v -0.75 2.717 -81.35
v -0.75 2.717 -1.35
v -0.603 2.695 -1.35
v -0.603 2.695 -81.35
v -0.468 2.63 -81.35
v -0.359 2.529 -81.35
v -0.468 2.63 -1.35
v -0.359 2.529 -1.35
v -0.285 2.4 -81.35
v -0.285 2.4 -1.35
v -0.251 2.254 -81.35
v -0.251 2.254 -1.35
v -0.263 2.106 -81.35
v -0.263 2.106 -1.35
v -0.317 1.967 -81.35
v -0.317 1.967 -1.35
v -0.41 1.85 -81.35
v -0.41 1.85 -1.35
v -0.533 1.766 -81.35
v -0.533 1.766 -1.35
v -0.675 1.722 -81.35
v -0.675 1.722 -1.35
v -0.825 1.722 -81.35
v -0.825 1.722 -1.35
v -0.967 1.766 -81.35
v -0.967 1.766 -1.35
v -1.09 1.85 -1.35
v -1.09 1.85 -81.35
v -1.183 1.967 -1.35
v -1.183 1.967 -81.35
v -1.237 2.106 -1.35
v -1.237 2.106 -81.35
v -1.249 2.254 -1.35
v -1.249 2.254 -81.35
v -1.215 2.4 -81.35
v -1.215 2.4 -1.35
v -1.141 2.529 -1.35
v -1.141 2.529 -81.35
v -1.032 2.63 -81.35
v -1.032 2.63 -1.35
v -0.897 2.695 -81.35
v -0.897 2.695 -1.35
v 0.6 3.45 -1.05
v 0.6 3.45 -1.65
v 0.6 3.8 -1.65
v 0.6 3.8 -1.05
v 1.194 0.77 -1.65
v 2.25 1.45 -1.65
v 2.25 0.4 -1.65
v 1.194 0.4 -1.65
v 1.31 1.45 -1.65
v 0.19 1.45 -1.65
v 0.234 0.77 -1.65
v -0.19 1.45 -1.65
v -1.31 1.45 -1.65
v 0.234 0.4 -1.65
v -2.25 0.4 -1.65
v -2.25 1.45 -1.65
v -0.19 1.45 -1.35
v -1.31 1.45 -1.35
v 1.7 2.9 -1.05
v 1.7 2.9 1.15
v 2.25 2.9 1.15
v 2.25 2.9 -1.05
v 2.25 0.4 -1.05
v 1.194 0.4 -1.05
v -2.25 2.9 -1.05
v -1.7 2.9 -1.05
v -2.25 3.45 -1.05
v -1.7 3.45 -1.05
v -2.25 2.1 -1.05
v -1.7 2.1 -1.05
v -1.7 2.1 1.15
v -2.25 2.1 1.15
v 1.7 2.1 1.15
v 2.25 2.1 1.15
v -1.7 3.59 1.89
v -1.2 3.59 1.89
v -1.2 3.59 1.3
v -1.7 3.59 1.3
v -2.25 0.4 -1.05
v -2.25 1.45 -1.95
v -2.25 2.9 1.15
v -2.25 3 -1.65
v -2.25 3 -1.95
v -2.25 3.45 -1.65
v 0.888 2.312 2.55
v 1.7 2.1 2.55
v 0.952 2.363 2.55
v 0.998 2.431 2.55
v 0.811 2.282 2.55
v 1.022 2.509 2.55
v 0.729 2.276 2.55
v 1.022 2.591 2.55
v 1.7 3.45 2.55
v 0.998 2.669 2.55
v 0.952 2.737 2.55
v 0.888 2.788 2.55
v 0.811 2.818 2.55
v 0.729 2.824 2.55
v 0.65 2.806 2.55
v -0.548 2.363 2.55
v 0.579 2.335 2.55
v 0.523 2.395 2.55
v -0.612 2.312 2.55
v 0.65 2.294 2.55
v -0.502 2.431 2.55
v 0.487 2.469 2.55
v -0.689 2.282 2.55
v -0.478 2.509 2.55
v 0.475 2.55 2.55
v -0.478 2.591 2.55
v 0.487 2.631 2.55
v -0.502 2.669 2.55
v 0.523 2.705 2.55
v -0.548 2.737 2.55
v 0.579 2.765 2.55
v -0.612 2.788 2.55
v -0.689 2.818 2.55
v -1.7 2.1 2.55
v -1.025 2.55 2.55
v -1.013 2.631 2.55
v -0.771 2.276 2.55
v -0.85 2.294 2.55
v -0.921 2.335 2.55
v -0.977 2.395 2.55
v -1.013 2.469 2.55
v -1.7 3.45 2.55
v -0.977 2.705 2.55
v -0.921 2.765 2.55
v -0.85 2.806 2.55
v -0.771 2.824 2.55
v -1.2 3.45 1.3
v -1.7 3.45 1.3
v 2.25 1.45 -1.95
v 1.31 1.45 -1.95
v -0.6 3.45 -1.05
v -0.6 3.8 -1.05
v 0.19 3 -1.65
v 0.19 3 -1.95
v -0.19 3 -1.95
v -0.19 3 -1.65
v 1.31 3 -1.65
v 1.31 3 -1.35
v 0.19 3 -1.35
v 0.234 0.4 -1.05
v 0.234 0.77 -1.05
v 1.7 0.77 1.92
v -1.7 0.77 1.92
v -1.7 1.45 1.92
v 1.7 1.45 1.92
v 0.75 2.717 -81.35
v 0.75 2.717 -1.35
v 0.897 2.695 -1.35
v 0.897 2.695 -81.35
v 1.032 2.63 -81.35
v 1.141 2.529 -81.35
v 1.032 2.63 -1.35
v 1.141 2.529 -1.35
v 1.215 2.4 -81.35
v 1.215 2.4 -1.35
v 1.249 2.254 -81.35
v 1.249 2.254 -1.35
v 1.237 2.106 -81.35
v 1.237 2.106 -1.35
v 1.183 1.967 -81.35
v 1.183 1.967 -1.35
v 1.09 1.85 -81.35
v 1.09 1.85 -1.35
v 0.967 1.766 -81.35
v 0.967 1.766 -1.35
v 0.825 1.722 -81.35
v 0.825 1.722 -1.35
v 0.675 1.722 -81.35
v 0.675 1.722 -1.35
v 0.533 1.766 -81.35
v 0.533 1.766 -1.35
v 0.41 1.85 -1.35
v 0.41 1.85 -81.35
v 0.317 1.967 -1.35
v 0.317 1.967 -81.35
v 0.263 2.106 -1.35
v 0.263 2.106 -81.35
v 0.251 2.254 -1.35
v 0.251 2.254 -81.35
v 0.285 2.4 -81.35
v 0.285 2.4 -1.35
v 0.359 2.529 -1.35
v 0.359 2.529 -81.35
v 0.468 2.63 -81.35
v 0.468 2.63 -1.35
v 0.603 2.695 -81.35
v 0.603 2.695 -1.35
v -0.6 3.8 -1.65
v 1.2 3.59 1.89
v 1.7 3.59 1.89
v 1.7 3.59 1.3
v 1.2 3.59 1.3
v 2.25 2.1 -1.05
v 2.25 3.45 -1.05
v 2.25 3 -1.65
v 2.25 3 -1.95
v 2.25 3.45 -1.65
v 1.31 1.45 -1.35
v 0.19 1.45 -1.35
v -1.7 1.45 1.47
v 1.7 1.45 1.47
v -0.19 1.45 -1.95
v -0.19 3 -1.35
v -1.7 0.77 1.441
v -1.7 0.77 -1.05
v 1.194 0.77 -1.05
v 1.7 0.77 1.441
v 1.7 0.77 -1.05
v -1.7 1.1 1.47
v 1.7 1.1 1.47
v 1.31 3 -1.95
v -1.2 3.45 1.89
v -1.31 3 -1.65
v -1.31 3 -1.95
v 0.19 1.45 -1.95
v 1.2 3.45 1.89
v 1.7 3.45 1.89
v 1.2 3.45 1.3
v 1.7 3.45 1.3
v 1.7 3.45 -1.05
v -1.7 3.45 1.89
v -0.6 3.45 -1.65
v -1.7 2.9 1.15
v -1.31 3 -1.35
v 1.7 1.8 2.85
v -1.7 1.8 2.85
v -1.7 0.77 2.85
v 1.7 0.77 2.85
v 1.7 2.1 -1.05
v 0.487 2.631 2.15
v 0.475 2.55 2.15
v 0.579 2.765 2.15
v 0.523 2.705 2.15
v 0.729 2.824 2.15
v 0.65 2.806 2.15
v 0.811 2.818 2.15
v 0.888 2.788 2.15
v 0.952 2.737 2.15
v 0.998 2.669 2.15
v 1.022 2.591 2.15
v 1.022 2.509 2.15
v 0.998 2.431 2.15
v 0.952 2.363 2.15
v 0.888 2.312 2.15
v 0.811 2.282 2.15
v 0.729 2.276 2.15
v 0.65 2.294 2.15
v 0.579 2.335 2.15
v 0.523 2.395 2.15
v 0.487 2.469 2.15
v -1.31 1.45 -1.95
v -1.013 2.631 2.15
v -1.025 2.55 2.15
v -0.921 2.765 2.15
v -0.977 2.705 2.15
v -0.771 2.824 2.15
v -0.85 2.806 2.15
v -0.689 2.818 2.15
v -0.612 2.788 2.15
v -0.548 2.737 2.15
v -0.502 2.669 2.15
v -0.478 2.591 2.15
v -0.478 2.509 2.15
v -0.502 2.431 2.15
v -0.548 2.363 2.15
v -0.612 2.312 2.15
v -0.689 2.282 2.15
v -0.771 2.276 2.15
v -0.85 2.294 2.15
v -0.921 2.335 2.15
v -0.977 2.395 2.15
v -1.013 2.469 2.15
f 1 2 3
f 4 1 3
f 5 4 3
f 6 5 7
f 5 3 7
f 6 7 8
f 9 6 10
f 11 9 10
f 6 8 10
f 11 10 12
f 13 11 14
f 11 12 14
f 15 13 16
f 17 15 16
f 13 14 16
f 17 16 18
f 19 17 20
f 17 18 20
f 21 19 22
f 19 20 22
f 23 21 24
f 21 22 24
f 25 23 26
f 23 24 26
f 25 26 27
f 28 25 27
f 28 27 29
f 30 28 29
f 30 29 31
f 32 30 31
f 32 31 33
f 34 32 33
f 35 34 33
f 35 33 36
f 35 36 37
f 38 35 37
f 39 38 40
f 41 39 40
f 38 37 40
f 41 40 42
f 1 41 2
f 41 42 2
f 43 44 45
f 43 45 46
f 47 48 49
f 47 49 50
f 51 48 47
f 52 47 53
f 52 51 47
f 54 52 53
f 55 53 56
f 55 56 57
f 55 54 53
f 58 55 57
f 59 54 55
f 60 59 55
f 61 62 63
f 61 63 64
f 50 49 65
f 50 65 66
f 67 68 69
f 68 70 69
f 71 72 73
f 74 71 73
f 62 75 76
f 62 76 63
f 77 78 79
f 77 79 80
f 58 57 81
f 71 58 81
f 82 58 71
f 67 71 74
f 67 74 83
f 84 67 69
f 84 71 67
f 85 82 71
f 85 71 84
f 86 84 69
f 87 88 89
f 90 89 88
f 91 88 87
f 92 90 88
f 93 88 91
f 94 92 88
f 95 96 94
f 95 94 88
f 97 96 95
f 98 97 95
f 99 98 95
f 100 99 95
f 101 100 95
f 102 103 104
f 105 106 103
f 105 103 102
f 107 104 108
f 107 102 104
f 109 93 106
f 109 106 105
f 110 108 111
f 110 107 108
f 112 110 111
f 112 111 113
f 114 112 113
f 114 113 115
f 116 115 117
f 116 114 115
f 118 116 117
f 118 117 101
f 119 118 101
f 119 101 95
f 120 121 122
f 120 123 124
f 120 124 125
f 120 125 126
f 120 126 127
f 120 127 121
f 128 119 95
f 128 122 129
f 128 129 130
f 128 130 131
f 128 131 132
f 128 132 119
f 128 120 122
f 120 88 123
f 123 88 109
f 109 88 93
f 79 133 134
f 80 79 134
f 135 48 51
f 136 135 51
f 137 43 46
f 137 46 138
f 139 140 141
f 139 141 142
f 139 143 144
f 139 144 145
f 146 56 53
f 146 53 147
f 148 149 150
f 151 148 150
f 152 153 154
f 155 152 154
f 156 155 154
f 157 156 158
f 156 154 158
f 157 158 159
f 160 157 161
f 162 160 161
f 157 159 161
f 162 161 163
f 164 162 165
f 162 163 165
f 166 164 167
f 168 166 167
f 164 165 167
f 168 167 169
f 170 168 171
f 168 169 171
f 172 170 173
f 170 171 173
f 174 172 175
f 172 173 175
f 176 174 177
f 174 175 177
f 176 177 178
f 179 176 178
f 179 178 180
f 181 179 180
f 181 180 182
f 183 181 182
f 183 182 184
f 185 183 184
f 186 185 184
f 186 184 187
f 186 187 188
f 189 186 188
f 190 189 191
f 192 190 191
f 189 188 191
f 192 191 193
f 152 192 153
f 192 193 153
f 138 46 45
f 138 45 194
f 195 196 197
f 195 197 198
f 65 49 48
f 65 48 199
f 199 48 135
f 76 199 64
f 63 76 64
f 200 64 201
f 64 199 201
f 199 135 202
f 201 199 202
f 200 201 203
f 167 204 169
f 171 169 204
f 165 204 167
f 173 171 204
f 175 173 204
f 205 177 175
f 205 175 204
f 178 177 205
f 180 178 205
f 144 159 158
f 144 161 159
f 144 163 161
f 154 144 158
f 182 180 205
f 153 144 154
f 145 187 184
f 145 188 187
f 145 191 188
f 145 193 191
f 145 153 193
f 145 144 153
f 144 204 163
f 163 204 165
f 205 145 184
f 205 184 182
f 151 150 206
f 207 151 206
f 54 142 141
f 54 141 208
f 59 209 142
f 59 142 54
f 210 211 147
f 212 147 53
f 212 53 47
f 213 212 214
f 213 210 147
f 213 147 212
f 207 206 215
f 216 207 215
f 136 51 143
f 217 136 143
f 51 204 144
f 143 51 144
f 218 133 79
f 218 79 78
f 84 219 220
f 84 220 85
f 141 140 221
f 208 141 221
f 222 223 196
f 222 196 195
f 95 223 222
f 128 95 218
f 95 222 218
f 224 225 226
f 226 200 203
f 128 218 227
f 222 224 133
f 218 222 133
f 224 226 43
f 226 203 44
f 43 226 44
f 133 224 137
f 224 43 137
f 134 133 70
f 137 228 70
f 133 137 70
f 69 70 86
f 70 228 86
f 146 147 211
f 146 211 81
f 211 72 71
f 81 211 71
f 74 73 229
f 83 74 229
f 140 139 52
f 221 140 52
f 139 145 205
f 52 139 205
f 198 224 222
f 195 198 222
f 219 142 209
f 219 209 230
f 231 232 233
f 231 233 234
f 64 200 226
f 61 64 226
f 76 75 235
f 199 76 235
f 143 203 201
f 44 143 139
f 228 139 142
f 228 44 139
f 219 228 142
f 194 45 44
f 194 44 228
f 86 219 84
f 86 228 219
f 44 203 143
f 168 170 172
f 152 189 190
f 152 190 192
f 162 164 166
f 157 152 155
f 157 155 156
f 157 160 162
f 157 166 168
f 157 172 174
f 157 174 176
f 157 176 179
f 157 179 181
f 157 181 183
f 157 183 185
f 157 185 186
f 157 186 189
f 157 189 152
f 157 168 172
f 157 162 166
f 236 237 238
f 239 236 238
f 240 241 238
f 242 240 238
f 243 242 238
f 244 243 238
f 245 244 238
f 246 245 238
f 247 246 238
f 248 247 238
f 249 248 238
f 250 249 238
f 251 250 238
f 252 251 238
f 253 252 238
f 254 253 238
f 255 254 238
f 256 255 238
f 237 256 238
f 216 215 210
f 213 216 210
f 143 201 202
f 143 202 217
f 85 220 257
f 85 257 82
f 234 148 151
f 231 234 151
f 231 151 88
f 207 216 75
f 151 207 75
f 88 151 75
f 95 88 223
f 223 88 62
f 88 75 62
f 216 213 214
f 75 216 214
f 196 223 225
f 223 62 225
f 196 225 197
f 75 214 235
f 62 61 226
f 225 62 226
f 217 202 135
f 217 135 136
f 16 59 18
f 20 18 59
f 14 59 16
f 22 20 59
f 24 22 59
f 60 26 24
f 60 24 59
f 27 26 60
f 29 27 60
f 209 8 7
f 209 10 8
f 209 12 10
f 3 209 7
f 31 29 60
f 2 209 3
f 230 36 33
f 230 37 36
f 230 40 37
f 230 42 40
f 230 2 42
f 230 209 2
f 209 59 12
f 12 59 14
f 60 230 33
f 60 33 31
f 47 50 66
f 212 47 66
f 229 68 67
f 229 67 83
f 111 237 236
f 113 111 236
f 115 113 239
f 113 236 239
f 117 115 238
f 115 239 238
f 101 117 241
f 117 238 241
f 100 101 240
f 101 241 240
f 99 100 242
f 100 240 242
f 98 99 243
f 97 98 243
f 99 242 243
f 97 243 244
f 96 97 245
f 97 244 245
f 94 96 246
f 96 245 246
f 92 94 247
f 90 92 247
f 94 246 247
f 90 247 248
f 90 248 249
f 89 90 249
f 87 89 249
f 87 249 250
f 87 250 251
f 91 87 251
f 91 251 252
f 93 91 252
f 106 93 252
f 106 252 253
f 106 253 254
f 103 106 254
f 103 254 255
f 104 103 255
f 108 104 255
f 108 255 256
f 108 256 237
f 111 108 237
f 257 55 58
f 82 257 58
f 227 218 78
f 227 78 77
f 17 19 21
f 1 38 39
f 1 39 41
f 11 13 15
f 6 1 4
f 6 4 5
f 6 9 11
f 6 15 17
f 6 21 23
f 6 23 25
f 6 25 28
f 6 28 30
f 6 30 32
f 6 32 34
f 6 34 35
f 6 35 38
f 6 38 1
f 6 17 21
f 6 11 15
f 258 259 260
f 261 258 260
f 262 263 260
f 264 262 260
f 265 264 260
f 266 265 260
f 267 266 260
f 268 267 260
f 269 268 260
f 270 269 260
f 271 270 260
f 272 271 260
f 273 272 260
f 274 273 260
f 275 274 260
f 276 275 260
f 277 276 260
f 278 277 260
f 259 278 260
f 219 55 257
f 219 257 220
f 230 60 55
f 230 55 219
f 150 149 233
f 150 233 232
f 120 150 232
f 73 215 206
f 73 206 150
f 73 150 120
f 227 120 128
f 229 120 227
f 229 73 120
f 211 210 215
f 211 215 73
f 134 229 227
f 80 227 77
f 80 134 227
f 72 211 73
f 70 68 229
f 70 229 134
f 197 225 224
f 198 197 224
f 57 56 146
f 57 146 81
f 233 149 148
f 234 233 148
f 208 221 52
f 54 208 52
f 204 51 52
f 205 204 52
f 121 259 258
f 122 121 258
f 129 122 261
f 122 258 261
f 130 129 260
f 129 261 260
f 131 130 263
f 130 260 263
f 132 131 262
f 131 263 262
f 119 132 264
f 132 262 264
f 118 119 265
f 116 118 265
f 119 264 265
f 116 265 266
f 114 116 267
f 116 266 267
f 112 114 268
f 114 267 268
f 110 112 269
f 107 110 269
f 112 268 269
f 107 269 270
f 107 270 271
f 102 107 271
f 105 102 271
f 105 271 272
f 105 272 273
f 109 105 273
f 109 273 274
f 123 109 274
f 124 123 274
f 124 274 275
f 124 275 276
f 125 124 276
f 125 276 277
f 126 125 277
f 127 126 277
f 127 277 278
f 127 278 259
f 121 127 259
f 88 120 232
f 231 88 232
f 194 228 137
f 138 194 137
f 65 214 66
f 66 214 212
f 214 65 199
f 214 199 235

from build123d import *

# Parameters (mm, degrees)
SKETCH1_W                        = 4.5
SKETCH1_H                        = 3.05
BOSS_EXTRUDE1_DEPTH              = 0.6
SKETCH2_W                        = 0.94
SKETCH2_H                        = 1.55
BOSS_EXTRUDE2_DEPTH              = 0.3
SKETCH3_W                        = 0.94
SKETCH3_H                        = 1.55
BOSS_EXTRUDE3_DEPTH              = 0.3
SKETCH4_W                        = 2.62
SKETCH4_H                        = 1.55
CUT_EXTRUDE1_DEPTH               = 0.3
SKETCH5_W                        = 3.4
SKETCH5_H                        = 2.68
BOSS_EXTRUDE4_DEPTH              = 3.9
SKETCH6_W                        = 2.2
SKETCH6_H                        = 0.8
BOSS_EXTRUDE5_DEPTH              = 0.55
SKETCH7_W                        = 2.2
SKETCH7_H                        = 0.8
BOSS_EXTRUDE6_DEPTH              = 0.55
SKETCH8_W                        = 0.3
SKETCH8_H                        = 1.35
CUT_EXTRUDE2_DEPTH               = 6.968877616
CUT_EXTRUDE3_DEPTH               = 6.968877616
SKETCH10_W                       = 0.5
SKETCH10_H                       = 0.59
BOSS_EXTRUDE7_DEPTH              = 0.14
SKETCH11_W                       = 1.2
SKETCH11_H                       = 0.6
BOSS_EXTRUDE8_DEPTH              = 0.35
SKETCH12_W                       = 0.5
SKETCH12_H                       = 0.59
BOSS_EXTRUDE9_DEPTH              = 0.14
DRAFT1_ANGLE                     = 45
F_0_55_0_55_DIAMETER_HOLE1_D     = 0.55
F_0_55_0_55_DIAMETER_HOLE1_DEPTH = 0.4
RIB1_START                       = -0.19
RIB1_OUTLINE_W                   = 1.55
RIB1_OUTLINE_H                   = 0.6
RIB1_DEPTH                       = 0.38
SKETCH16_R                       = 0.5
BOSS_EXTRUDE10_DEPTH             = 80
SKETCH17_W                       = 0.960697218
SKETCH17_H                       = 0.952555717
CUT_EXTRUDE4_DEPTH               = 0.37


# Read off the part's stored shape, not the designer's step: Rib1
with BuildPart() as part:
    # Sketch1 → Boss-Extrude1 (new body)
    with BuildSketch(Plane(origin=(0, 0, -1.65), x_dir=(-1, 0, 0), z_dir=(0, 0, -1))):
        with Locations((0, 1.925)):
            Rectangle(SKETCH1_W, SKETCH1_H)
    extrude(amount=-BOSS_EXTRUDE1_DEPTH)

    # Sketch2 → Boss-Extrude2 (add)
    with BuildSketch(Plane(origin=(0, 0, -1.65), x_dir=(-1, 0, 0), z_dir=(0, 0, -1))):
        with Locations((1.78, 2.225)):
            Rectangle(SKETCH2_W, SKETCH2_H)
    extrude(amount=BOSS_EXTRUDE2_DEPTH)

    # Sketch3 → Boss-Extrude3 (add)
    with BuildSketch(Plane(origin=(0, 0, -1.65), x_dir=(-1, 0, 0), z_dir=(0, 0, -1))):
        with Locations((-1.78, 2.225)):
            Rectangle(SKETCH3_W, SKETCH3_H)
    extrude(amount=BOSS_EXTRUDE3_DEPTH)

    # Sketch4 → Cut-Extrude1 (cut)
    with BuildSketch(Plane(origin=(0, 0, -1.65), x_dir=(-1, 0, 0), z_dir=(0, 0, -1))):
        with Locations((0, 2.225)):
            Rectangle(SKETCH4_W, SKETCH4_H)
    extrude(amount=-CUT_EXTRUDE1_DEPTH, mode=Mode.SUBTRACT)

    # Sketch5 → Boss-Extrude4 (add)
    with BuildSketch(Plane.XY.offset(-1.05)):
        with Locations((0, 2.11)):
            Rectangle(SKETCH5_W, SKETCH5_H)
    extrude(amount=BOSS_EXTRUDE4_DEPTH)

    # Sketch6 → Boss-Extrude5 (add)
    with BuildSketch(Plane(origin=(1.7, 0, 0), x_dir=(0, 0, -1), z_dir=(1, 0, 0))):
        with Locations((-0.05, 2.5)):
            Rectangle(SKETCH6_W, SKETCH6_H)
    extrude(amount=BOSS_EXTRUDE5_DEPTH)

    # Sketch7 → Boss-Extrude6 (add)
    with BuildSketch(Plane.ZY.offset(1.7)):
        with Locations((0.05, 2.5)):
            Rectangle(SKETCH7_W, SKETCH7_H)
    extrude(amount=BOSS_EXTRUDE6_DEPTH)

    # Sketch8 → Cut-Extrude2 (cut, through all)
    with BuildSketch(Plane.ZY.offset(1.7)):
        with Locations((2.7, 2.775)):
            Rectangle(SKETCH8_W, SKETCH8_H)
    extrude(amount=-CUT_EXTRUDE2_DEPTH, mode=Mode.SUBTRACT)

    # Sketch9 → Cut-Extrude3 (cut, through all)
    with BuildSketch(Plane.ZY.offset(1.7)):
        Polygon((1.4411, 0.77), (1.919971259, 0.77), (1.919971259, 1.45), (1.469971259, 1.45), (1.469971259, 1.1), align=None)
    extrude(amount=-CUT_EXTRUDE3_DEPTH, mode=Mode.SUBTRACT)

    # Sketch10 → Boss-Extrude7 (add)
    with BuildSketch(Plane(origin=(0, 3.45, 0), x_dir=(-1, 0, 0), z_dir=(0, 1, 0))):
        with Locations((1.45, 1.595)):
            Rectangle(SKETCH10_W, SKETCH10_H)
    extrude(amount=BOSS_EXTRUDE7_DEPTH)

    # Sketch11 → Boss-Extrude8 (add)
    with BuildSketch(Plane(origin=(0, 3.45, 0), x_dir=(-1, 0, 0), z_dir=(0, 1, 0))):
        with Locations((0, -1.35)):
            Rectangle(SKETCH11_W, SKETCH11_H)
    extrude(amount=BOSS_EXTRUDE8_DEPTH)

    # Sketch12 → Boss-Extrude9 (add)
    with BuildSketch(Plane(origin=(0, 3.45, 0), x_dir=(-1, 0, 0), z_dir=(0, 1, 0))):
        with Locations((-1.45, 1.595)):
            Rectangle(SKETCH12_W, SKETCH12_H)
    extrude(amount=BOSS_EXTRUDE9_DEPTH)

    # Draft1
    draft1_faces = [part.faces().sort_by_distance(p)[0] for p in [
        (0, 2.1, 2.7),
    ]]
    draft(draft1_faces, Plane(origin=(2.250025, 3.45, 2.55), x_dir=(0, 1, 0), z_dir=(0, 0, 1)), DRAFT1_ANGLE)

    # Ø0.55 (0.55) Diameter Hole1
    with Locations(Plane.XY.offset(2.55)):
        with Locations((-0.75, 2.55), (0.75, 2.55)):
            Hole(F_0_55_0_55_DIAMETER_HOLE1_D / 2, depth=F_0_55_0_55_DIAMETER_HOLE1_DEPTH)

    # Rib1 outline → Rib1 (add)
    with BuildSketch(Plane(origin=(0, 0, 0), x_dir=(0, -1, 0), z_dir=(-1, 0, 0)).offset(RIB1_START)):
        with Locations((-2.225, -1.65)):
            Rectangle(RIB1_OUTLINE_W, RIB1_OUTLINE_H)
    extrude(amount=RIB1_DEPTH)

    # Sketch16 → Boss-Extrude10 (add)
    with BuildSketch(Plane(origin=(0, 0, -1.35), x_dir=(-1, 0, 0), z_dir=(0, 0, -1))):
        with Locations(Location((-0.75, 2.216914792, 0), (0, 0, 90))):
            Circle(SKETCH16_R)
        with Locations(Location((0.75, 2.216914792, 0), (0, 0, 90))):
            Circle(SKETCH16_R)
    extrude(amount=BOSS_EXTRUDE10_DEPTH)

    # Sketch17 → Cut-Extrude4 (cut)
    with BuildSketch(Plane.XZ.offset(-0.4)):
        with Locations((0.713949263, -1.321573248)):
            Rectangle(SKETCH17_W, SKETCH17_H)
    extrude(amount=-CUT_EXTRUDE4_DEPTH, mode=Mode.SUBTRACT)


solid = part.part
